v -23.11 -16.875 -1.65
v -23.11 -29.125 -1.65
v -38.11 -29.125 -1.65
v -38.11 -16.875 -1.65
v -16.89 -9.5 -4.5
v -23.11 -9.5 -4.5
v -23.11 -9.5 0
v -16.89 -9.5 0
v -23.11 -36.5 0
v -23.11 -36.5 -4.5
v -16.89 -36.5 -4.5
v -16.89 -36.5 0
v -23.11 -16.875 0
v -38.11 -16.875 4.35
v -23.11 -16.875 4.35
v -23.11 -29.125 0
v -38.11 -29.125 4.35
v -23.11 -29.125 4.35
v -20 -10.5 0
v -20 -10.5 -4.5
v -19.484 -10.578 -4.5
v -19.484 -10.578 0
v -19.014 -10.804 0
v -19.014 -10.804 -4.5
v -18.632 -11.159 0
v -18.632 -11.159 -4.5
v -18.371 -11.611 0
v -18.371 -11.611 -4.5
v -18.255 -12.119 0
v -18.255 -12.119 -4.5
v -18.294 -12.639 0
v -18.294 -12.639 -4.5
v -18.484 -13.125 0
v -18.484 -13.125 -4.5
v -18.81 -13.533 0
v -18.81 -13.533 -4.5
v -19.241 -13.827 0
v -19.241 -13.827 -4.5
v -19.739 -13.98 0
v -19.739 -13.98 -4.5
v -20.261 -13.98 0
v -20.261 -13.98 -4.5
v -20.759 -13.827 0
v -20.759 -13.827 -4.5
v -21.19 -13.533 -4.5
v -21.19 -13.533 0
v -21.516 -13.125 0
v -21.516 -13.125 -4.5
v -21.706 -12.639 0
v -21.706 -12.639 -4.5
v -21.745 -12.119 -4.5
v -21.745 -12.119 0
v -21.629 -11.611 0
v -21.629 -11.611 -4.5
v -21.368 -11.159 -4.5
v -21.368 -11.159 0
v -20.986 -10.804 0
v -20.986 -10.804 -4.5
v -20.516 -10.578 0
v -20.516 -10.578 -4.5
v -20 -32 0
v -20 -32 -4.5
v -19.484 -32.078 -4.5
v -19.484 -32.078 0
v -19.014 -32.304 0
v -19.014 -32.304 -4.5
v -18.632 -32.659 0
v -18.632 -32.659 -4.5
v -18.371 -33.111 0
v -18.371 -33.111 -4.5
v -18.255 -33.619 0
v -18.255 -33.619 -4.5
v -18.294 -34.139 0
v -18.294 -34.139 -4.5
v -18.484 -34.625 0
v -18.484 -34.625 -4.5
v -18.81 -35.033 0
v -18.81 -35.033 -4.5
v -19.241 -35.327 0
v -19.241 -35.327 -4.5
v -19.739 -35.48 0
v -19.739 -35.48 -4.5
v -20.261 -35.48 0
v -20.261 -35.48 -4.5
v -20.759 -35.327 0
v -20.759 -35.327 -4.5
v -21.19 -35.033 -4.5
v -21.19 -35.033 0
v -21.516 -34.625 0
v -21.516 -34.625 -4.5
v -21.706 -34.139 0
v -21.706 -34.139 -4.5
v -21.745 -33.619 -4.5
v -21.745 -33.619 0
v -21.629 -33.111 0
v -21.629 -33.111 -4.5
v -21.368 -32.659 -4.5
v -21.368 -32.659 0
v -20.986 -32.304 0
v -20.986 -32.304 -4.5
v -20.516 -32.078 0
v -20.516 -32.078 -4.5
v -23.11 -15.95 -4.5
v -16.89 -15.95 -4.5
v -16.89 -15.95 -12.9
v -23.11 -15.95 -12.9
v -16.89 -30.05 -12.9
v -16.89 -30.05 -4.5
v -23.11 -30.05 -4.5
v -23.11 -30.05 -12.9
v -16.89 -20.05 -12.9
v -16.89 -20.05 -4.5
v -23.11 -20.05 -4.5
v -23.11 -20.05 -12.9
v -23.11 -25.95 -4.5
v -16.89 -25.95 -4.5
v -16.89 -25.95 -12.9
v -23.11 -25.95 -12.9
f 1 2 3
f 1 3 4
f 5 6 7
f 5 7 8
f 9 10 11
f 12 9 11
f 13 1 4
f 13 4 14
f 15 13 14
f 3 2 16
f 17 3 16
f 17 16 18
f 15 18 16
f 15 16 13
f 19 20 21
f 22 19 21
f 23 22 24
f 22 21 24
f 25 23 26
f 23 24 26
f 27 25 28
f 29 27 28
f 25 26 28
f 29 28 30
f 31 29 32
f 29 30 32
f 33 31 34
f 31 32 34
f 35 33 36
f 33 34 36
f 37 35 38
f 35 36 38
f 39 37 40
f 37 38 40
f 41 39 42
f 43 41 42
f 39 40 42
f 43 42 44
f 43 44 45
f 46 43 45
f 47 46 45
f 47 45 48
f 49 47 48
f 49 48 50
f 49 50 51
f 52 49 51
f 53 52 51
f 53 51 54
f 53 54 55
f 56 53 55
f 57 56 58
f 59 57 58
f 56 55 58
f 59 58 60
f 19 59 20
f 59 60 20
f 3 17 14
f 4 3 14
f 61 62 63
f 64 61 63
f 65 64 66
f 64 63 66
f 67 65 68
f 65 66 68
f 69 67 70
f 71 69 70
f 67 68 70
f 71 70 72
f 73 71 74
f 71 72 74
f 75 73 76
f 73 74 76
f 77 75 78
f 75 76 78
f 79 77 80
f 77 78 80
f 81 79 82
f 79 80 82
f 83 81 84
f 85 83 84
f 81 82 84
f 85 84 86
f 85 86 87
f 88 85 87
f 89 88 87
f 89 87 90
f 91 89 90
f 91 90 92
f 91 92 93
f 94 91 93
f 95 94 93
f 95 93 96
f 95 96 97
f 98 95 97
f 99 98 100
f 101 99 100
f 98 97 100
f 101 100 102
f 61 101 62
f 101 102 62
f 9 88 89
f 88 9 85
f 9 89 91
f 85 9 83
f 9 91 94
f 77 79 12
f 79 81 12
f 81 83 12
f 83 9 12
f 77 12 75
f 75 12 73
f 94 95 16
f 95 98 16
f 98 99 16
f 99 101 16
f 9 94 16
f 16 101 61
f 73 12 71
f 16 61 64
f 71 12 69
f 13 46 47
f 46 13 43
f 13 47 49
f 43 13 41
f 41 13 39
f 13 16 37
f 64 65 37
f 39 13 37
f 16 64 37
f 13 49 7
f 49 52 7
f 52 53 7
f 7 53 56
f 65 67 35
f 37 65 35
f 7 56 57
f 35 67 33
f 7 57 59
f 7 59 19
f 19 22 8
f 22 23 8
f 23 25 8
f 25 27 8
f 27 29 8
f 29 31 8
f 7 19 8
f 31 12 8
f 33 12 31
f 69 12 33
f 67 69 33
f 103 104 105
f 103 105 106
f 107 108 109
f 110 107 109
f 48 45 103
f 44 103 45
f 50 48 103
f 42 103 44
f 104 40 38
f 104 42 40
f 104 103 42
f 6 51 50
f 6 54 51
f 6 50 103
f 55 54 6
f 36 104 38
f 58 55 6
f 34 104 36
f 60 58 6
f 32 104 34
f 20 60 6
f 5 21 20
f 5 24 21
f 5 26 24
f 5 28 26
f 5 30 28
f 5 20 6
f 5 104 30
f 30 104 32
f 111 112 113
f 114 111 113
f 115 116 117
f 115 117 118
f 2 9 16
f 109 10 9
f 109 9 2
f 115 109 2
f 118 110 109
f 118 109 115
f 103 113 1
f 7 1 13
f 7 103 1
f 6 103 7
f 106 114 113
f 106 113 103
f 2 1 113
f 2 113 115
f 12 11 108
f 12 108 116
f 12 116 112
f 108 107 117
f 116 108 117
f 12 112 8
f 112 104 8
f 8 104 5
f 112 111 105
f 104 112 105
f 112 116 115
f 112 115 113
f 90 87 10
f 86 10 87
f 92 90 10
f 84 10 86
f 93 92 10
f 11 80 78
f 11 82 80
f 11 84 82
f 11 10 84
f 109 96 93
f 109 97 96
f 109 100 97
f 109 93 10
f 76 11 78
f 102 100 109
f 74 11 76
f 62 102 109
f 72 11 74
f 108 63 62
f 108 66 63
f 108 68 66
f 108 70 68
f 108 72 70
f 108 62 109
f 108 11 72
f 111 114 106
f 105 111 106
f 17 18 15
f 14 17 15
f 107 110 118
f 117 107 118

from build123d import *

# Parameters (mm, degrees)
SKETCH028_W             = 27
SKETCH028_H             = 6.22
SKETCH028_R             = 1.75
PAD016_DEPTH            = 4.5
SKETCH029_W             = 4.1
SKETCH029_H             = 6.22
PAD017_DEPTH            = 8.4
SKETCH030_W             = 12.25
SKETCH030_H             = 6
PAD018_DEPTH            = 15
BODY004_PLACEMENT_ANGLE = 90


with BuildPart() as capteurvitesse:
    # Sketch028 → Pad016 (new body)
    with BuildSketch(Plane.XY):
        Rectangle(SKETCH028_W, SKETCH028_H)
        with Locations((10.75, 0)):
            Circle(SKETCH028_R, mode=Mode.SUBTRACT)
        with Locations((-10.75, 0)):
            Circle(SKETCH028_R, mode=Mode.SUBTRACT)
    extrude(amount=PAD016_DEPTH)

    # Sketch029 (on Face7 of Pad016) → Pad017 (join)
    with BuildSketch(Plane(origin=(0, 0, 0), x_dir=(1, 0, 0), z_dir=(0, 0, -1))):
        with Locations((-5, 0)):
            Rectangle(SKETCH029_W, SKETCH029_H)
        with Locations((5, 0)):
            Rectangle(SKETCH029_W, SKETCH029_H)
    extrude(amount=PAD017_DEPTH)

    # Sketch030 (on Face10 of Pad017) → Pad018 (join)
    with BuildSketch(Plane.XZ.offset(3.11)):
        with Locations((0, 5.85)):
            Rectangle(SKETCH030_W, SKETCH030_H)
    extrude(amount=PAD018_DEPTH)


with BuildPart() as capteurvitesse_1:
    # Body004 placement: moved
    add(capteurvitesse.part.moved(Location((-20, 23, -4.5))).rotate(Axis((-20, 23, -4.5), (0, 0, -1)), BODY004_PLACEMENT_ANGLE))


with BuildPart() as part_mirroring002:
    # Part__Mirroring002: instance of CapteurVitesse
    add(capteurvitesse_1.part.mirror(Plane(origin=(0, 0, 0), x_dir=(1, 0, 0), z_dir=(0, 1, 0))))


solid = part_mirroring002.part
